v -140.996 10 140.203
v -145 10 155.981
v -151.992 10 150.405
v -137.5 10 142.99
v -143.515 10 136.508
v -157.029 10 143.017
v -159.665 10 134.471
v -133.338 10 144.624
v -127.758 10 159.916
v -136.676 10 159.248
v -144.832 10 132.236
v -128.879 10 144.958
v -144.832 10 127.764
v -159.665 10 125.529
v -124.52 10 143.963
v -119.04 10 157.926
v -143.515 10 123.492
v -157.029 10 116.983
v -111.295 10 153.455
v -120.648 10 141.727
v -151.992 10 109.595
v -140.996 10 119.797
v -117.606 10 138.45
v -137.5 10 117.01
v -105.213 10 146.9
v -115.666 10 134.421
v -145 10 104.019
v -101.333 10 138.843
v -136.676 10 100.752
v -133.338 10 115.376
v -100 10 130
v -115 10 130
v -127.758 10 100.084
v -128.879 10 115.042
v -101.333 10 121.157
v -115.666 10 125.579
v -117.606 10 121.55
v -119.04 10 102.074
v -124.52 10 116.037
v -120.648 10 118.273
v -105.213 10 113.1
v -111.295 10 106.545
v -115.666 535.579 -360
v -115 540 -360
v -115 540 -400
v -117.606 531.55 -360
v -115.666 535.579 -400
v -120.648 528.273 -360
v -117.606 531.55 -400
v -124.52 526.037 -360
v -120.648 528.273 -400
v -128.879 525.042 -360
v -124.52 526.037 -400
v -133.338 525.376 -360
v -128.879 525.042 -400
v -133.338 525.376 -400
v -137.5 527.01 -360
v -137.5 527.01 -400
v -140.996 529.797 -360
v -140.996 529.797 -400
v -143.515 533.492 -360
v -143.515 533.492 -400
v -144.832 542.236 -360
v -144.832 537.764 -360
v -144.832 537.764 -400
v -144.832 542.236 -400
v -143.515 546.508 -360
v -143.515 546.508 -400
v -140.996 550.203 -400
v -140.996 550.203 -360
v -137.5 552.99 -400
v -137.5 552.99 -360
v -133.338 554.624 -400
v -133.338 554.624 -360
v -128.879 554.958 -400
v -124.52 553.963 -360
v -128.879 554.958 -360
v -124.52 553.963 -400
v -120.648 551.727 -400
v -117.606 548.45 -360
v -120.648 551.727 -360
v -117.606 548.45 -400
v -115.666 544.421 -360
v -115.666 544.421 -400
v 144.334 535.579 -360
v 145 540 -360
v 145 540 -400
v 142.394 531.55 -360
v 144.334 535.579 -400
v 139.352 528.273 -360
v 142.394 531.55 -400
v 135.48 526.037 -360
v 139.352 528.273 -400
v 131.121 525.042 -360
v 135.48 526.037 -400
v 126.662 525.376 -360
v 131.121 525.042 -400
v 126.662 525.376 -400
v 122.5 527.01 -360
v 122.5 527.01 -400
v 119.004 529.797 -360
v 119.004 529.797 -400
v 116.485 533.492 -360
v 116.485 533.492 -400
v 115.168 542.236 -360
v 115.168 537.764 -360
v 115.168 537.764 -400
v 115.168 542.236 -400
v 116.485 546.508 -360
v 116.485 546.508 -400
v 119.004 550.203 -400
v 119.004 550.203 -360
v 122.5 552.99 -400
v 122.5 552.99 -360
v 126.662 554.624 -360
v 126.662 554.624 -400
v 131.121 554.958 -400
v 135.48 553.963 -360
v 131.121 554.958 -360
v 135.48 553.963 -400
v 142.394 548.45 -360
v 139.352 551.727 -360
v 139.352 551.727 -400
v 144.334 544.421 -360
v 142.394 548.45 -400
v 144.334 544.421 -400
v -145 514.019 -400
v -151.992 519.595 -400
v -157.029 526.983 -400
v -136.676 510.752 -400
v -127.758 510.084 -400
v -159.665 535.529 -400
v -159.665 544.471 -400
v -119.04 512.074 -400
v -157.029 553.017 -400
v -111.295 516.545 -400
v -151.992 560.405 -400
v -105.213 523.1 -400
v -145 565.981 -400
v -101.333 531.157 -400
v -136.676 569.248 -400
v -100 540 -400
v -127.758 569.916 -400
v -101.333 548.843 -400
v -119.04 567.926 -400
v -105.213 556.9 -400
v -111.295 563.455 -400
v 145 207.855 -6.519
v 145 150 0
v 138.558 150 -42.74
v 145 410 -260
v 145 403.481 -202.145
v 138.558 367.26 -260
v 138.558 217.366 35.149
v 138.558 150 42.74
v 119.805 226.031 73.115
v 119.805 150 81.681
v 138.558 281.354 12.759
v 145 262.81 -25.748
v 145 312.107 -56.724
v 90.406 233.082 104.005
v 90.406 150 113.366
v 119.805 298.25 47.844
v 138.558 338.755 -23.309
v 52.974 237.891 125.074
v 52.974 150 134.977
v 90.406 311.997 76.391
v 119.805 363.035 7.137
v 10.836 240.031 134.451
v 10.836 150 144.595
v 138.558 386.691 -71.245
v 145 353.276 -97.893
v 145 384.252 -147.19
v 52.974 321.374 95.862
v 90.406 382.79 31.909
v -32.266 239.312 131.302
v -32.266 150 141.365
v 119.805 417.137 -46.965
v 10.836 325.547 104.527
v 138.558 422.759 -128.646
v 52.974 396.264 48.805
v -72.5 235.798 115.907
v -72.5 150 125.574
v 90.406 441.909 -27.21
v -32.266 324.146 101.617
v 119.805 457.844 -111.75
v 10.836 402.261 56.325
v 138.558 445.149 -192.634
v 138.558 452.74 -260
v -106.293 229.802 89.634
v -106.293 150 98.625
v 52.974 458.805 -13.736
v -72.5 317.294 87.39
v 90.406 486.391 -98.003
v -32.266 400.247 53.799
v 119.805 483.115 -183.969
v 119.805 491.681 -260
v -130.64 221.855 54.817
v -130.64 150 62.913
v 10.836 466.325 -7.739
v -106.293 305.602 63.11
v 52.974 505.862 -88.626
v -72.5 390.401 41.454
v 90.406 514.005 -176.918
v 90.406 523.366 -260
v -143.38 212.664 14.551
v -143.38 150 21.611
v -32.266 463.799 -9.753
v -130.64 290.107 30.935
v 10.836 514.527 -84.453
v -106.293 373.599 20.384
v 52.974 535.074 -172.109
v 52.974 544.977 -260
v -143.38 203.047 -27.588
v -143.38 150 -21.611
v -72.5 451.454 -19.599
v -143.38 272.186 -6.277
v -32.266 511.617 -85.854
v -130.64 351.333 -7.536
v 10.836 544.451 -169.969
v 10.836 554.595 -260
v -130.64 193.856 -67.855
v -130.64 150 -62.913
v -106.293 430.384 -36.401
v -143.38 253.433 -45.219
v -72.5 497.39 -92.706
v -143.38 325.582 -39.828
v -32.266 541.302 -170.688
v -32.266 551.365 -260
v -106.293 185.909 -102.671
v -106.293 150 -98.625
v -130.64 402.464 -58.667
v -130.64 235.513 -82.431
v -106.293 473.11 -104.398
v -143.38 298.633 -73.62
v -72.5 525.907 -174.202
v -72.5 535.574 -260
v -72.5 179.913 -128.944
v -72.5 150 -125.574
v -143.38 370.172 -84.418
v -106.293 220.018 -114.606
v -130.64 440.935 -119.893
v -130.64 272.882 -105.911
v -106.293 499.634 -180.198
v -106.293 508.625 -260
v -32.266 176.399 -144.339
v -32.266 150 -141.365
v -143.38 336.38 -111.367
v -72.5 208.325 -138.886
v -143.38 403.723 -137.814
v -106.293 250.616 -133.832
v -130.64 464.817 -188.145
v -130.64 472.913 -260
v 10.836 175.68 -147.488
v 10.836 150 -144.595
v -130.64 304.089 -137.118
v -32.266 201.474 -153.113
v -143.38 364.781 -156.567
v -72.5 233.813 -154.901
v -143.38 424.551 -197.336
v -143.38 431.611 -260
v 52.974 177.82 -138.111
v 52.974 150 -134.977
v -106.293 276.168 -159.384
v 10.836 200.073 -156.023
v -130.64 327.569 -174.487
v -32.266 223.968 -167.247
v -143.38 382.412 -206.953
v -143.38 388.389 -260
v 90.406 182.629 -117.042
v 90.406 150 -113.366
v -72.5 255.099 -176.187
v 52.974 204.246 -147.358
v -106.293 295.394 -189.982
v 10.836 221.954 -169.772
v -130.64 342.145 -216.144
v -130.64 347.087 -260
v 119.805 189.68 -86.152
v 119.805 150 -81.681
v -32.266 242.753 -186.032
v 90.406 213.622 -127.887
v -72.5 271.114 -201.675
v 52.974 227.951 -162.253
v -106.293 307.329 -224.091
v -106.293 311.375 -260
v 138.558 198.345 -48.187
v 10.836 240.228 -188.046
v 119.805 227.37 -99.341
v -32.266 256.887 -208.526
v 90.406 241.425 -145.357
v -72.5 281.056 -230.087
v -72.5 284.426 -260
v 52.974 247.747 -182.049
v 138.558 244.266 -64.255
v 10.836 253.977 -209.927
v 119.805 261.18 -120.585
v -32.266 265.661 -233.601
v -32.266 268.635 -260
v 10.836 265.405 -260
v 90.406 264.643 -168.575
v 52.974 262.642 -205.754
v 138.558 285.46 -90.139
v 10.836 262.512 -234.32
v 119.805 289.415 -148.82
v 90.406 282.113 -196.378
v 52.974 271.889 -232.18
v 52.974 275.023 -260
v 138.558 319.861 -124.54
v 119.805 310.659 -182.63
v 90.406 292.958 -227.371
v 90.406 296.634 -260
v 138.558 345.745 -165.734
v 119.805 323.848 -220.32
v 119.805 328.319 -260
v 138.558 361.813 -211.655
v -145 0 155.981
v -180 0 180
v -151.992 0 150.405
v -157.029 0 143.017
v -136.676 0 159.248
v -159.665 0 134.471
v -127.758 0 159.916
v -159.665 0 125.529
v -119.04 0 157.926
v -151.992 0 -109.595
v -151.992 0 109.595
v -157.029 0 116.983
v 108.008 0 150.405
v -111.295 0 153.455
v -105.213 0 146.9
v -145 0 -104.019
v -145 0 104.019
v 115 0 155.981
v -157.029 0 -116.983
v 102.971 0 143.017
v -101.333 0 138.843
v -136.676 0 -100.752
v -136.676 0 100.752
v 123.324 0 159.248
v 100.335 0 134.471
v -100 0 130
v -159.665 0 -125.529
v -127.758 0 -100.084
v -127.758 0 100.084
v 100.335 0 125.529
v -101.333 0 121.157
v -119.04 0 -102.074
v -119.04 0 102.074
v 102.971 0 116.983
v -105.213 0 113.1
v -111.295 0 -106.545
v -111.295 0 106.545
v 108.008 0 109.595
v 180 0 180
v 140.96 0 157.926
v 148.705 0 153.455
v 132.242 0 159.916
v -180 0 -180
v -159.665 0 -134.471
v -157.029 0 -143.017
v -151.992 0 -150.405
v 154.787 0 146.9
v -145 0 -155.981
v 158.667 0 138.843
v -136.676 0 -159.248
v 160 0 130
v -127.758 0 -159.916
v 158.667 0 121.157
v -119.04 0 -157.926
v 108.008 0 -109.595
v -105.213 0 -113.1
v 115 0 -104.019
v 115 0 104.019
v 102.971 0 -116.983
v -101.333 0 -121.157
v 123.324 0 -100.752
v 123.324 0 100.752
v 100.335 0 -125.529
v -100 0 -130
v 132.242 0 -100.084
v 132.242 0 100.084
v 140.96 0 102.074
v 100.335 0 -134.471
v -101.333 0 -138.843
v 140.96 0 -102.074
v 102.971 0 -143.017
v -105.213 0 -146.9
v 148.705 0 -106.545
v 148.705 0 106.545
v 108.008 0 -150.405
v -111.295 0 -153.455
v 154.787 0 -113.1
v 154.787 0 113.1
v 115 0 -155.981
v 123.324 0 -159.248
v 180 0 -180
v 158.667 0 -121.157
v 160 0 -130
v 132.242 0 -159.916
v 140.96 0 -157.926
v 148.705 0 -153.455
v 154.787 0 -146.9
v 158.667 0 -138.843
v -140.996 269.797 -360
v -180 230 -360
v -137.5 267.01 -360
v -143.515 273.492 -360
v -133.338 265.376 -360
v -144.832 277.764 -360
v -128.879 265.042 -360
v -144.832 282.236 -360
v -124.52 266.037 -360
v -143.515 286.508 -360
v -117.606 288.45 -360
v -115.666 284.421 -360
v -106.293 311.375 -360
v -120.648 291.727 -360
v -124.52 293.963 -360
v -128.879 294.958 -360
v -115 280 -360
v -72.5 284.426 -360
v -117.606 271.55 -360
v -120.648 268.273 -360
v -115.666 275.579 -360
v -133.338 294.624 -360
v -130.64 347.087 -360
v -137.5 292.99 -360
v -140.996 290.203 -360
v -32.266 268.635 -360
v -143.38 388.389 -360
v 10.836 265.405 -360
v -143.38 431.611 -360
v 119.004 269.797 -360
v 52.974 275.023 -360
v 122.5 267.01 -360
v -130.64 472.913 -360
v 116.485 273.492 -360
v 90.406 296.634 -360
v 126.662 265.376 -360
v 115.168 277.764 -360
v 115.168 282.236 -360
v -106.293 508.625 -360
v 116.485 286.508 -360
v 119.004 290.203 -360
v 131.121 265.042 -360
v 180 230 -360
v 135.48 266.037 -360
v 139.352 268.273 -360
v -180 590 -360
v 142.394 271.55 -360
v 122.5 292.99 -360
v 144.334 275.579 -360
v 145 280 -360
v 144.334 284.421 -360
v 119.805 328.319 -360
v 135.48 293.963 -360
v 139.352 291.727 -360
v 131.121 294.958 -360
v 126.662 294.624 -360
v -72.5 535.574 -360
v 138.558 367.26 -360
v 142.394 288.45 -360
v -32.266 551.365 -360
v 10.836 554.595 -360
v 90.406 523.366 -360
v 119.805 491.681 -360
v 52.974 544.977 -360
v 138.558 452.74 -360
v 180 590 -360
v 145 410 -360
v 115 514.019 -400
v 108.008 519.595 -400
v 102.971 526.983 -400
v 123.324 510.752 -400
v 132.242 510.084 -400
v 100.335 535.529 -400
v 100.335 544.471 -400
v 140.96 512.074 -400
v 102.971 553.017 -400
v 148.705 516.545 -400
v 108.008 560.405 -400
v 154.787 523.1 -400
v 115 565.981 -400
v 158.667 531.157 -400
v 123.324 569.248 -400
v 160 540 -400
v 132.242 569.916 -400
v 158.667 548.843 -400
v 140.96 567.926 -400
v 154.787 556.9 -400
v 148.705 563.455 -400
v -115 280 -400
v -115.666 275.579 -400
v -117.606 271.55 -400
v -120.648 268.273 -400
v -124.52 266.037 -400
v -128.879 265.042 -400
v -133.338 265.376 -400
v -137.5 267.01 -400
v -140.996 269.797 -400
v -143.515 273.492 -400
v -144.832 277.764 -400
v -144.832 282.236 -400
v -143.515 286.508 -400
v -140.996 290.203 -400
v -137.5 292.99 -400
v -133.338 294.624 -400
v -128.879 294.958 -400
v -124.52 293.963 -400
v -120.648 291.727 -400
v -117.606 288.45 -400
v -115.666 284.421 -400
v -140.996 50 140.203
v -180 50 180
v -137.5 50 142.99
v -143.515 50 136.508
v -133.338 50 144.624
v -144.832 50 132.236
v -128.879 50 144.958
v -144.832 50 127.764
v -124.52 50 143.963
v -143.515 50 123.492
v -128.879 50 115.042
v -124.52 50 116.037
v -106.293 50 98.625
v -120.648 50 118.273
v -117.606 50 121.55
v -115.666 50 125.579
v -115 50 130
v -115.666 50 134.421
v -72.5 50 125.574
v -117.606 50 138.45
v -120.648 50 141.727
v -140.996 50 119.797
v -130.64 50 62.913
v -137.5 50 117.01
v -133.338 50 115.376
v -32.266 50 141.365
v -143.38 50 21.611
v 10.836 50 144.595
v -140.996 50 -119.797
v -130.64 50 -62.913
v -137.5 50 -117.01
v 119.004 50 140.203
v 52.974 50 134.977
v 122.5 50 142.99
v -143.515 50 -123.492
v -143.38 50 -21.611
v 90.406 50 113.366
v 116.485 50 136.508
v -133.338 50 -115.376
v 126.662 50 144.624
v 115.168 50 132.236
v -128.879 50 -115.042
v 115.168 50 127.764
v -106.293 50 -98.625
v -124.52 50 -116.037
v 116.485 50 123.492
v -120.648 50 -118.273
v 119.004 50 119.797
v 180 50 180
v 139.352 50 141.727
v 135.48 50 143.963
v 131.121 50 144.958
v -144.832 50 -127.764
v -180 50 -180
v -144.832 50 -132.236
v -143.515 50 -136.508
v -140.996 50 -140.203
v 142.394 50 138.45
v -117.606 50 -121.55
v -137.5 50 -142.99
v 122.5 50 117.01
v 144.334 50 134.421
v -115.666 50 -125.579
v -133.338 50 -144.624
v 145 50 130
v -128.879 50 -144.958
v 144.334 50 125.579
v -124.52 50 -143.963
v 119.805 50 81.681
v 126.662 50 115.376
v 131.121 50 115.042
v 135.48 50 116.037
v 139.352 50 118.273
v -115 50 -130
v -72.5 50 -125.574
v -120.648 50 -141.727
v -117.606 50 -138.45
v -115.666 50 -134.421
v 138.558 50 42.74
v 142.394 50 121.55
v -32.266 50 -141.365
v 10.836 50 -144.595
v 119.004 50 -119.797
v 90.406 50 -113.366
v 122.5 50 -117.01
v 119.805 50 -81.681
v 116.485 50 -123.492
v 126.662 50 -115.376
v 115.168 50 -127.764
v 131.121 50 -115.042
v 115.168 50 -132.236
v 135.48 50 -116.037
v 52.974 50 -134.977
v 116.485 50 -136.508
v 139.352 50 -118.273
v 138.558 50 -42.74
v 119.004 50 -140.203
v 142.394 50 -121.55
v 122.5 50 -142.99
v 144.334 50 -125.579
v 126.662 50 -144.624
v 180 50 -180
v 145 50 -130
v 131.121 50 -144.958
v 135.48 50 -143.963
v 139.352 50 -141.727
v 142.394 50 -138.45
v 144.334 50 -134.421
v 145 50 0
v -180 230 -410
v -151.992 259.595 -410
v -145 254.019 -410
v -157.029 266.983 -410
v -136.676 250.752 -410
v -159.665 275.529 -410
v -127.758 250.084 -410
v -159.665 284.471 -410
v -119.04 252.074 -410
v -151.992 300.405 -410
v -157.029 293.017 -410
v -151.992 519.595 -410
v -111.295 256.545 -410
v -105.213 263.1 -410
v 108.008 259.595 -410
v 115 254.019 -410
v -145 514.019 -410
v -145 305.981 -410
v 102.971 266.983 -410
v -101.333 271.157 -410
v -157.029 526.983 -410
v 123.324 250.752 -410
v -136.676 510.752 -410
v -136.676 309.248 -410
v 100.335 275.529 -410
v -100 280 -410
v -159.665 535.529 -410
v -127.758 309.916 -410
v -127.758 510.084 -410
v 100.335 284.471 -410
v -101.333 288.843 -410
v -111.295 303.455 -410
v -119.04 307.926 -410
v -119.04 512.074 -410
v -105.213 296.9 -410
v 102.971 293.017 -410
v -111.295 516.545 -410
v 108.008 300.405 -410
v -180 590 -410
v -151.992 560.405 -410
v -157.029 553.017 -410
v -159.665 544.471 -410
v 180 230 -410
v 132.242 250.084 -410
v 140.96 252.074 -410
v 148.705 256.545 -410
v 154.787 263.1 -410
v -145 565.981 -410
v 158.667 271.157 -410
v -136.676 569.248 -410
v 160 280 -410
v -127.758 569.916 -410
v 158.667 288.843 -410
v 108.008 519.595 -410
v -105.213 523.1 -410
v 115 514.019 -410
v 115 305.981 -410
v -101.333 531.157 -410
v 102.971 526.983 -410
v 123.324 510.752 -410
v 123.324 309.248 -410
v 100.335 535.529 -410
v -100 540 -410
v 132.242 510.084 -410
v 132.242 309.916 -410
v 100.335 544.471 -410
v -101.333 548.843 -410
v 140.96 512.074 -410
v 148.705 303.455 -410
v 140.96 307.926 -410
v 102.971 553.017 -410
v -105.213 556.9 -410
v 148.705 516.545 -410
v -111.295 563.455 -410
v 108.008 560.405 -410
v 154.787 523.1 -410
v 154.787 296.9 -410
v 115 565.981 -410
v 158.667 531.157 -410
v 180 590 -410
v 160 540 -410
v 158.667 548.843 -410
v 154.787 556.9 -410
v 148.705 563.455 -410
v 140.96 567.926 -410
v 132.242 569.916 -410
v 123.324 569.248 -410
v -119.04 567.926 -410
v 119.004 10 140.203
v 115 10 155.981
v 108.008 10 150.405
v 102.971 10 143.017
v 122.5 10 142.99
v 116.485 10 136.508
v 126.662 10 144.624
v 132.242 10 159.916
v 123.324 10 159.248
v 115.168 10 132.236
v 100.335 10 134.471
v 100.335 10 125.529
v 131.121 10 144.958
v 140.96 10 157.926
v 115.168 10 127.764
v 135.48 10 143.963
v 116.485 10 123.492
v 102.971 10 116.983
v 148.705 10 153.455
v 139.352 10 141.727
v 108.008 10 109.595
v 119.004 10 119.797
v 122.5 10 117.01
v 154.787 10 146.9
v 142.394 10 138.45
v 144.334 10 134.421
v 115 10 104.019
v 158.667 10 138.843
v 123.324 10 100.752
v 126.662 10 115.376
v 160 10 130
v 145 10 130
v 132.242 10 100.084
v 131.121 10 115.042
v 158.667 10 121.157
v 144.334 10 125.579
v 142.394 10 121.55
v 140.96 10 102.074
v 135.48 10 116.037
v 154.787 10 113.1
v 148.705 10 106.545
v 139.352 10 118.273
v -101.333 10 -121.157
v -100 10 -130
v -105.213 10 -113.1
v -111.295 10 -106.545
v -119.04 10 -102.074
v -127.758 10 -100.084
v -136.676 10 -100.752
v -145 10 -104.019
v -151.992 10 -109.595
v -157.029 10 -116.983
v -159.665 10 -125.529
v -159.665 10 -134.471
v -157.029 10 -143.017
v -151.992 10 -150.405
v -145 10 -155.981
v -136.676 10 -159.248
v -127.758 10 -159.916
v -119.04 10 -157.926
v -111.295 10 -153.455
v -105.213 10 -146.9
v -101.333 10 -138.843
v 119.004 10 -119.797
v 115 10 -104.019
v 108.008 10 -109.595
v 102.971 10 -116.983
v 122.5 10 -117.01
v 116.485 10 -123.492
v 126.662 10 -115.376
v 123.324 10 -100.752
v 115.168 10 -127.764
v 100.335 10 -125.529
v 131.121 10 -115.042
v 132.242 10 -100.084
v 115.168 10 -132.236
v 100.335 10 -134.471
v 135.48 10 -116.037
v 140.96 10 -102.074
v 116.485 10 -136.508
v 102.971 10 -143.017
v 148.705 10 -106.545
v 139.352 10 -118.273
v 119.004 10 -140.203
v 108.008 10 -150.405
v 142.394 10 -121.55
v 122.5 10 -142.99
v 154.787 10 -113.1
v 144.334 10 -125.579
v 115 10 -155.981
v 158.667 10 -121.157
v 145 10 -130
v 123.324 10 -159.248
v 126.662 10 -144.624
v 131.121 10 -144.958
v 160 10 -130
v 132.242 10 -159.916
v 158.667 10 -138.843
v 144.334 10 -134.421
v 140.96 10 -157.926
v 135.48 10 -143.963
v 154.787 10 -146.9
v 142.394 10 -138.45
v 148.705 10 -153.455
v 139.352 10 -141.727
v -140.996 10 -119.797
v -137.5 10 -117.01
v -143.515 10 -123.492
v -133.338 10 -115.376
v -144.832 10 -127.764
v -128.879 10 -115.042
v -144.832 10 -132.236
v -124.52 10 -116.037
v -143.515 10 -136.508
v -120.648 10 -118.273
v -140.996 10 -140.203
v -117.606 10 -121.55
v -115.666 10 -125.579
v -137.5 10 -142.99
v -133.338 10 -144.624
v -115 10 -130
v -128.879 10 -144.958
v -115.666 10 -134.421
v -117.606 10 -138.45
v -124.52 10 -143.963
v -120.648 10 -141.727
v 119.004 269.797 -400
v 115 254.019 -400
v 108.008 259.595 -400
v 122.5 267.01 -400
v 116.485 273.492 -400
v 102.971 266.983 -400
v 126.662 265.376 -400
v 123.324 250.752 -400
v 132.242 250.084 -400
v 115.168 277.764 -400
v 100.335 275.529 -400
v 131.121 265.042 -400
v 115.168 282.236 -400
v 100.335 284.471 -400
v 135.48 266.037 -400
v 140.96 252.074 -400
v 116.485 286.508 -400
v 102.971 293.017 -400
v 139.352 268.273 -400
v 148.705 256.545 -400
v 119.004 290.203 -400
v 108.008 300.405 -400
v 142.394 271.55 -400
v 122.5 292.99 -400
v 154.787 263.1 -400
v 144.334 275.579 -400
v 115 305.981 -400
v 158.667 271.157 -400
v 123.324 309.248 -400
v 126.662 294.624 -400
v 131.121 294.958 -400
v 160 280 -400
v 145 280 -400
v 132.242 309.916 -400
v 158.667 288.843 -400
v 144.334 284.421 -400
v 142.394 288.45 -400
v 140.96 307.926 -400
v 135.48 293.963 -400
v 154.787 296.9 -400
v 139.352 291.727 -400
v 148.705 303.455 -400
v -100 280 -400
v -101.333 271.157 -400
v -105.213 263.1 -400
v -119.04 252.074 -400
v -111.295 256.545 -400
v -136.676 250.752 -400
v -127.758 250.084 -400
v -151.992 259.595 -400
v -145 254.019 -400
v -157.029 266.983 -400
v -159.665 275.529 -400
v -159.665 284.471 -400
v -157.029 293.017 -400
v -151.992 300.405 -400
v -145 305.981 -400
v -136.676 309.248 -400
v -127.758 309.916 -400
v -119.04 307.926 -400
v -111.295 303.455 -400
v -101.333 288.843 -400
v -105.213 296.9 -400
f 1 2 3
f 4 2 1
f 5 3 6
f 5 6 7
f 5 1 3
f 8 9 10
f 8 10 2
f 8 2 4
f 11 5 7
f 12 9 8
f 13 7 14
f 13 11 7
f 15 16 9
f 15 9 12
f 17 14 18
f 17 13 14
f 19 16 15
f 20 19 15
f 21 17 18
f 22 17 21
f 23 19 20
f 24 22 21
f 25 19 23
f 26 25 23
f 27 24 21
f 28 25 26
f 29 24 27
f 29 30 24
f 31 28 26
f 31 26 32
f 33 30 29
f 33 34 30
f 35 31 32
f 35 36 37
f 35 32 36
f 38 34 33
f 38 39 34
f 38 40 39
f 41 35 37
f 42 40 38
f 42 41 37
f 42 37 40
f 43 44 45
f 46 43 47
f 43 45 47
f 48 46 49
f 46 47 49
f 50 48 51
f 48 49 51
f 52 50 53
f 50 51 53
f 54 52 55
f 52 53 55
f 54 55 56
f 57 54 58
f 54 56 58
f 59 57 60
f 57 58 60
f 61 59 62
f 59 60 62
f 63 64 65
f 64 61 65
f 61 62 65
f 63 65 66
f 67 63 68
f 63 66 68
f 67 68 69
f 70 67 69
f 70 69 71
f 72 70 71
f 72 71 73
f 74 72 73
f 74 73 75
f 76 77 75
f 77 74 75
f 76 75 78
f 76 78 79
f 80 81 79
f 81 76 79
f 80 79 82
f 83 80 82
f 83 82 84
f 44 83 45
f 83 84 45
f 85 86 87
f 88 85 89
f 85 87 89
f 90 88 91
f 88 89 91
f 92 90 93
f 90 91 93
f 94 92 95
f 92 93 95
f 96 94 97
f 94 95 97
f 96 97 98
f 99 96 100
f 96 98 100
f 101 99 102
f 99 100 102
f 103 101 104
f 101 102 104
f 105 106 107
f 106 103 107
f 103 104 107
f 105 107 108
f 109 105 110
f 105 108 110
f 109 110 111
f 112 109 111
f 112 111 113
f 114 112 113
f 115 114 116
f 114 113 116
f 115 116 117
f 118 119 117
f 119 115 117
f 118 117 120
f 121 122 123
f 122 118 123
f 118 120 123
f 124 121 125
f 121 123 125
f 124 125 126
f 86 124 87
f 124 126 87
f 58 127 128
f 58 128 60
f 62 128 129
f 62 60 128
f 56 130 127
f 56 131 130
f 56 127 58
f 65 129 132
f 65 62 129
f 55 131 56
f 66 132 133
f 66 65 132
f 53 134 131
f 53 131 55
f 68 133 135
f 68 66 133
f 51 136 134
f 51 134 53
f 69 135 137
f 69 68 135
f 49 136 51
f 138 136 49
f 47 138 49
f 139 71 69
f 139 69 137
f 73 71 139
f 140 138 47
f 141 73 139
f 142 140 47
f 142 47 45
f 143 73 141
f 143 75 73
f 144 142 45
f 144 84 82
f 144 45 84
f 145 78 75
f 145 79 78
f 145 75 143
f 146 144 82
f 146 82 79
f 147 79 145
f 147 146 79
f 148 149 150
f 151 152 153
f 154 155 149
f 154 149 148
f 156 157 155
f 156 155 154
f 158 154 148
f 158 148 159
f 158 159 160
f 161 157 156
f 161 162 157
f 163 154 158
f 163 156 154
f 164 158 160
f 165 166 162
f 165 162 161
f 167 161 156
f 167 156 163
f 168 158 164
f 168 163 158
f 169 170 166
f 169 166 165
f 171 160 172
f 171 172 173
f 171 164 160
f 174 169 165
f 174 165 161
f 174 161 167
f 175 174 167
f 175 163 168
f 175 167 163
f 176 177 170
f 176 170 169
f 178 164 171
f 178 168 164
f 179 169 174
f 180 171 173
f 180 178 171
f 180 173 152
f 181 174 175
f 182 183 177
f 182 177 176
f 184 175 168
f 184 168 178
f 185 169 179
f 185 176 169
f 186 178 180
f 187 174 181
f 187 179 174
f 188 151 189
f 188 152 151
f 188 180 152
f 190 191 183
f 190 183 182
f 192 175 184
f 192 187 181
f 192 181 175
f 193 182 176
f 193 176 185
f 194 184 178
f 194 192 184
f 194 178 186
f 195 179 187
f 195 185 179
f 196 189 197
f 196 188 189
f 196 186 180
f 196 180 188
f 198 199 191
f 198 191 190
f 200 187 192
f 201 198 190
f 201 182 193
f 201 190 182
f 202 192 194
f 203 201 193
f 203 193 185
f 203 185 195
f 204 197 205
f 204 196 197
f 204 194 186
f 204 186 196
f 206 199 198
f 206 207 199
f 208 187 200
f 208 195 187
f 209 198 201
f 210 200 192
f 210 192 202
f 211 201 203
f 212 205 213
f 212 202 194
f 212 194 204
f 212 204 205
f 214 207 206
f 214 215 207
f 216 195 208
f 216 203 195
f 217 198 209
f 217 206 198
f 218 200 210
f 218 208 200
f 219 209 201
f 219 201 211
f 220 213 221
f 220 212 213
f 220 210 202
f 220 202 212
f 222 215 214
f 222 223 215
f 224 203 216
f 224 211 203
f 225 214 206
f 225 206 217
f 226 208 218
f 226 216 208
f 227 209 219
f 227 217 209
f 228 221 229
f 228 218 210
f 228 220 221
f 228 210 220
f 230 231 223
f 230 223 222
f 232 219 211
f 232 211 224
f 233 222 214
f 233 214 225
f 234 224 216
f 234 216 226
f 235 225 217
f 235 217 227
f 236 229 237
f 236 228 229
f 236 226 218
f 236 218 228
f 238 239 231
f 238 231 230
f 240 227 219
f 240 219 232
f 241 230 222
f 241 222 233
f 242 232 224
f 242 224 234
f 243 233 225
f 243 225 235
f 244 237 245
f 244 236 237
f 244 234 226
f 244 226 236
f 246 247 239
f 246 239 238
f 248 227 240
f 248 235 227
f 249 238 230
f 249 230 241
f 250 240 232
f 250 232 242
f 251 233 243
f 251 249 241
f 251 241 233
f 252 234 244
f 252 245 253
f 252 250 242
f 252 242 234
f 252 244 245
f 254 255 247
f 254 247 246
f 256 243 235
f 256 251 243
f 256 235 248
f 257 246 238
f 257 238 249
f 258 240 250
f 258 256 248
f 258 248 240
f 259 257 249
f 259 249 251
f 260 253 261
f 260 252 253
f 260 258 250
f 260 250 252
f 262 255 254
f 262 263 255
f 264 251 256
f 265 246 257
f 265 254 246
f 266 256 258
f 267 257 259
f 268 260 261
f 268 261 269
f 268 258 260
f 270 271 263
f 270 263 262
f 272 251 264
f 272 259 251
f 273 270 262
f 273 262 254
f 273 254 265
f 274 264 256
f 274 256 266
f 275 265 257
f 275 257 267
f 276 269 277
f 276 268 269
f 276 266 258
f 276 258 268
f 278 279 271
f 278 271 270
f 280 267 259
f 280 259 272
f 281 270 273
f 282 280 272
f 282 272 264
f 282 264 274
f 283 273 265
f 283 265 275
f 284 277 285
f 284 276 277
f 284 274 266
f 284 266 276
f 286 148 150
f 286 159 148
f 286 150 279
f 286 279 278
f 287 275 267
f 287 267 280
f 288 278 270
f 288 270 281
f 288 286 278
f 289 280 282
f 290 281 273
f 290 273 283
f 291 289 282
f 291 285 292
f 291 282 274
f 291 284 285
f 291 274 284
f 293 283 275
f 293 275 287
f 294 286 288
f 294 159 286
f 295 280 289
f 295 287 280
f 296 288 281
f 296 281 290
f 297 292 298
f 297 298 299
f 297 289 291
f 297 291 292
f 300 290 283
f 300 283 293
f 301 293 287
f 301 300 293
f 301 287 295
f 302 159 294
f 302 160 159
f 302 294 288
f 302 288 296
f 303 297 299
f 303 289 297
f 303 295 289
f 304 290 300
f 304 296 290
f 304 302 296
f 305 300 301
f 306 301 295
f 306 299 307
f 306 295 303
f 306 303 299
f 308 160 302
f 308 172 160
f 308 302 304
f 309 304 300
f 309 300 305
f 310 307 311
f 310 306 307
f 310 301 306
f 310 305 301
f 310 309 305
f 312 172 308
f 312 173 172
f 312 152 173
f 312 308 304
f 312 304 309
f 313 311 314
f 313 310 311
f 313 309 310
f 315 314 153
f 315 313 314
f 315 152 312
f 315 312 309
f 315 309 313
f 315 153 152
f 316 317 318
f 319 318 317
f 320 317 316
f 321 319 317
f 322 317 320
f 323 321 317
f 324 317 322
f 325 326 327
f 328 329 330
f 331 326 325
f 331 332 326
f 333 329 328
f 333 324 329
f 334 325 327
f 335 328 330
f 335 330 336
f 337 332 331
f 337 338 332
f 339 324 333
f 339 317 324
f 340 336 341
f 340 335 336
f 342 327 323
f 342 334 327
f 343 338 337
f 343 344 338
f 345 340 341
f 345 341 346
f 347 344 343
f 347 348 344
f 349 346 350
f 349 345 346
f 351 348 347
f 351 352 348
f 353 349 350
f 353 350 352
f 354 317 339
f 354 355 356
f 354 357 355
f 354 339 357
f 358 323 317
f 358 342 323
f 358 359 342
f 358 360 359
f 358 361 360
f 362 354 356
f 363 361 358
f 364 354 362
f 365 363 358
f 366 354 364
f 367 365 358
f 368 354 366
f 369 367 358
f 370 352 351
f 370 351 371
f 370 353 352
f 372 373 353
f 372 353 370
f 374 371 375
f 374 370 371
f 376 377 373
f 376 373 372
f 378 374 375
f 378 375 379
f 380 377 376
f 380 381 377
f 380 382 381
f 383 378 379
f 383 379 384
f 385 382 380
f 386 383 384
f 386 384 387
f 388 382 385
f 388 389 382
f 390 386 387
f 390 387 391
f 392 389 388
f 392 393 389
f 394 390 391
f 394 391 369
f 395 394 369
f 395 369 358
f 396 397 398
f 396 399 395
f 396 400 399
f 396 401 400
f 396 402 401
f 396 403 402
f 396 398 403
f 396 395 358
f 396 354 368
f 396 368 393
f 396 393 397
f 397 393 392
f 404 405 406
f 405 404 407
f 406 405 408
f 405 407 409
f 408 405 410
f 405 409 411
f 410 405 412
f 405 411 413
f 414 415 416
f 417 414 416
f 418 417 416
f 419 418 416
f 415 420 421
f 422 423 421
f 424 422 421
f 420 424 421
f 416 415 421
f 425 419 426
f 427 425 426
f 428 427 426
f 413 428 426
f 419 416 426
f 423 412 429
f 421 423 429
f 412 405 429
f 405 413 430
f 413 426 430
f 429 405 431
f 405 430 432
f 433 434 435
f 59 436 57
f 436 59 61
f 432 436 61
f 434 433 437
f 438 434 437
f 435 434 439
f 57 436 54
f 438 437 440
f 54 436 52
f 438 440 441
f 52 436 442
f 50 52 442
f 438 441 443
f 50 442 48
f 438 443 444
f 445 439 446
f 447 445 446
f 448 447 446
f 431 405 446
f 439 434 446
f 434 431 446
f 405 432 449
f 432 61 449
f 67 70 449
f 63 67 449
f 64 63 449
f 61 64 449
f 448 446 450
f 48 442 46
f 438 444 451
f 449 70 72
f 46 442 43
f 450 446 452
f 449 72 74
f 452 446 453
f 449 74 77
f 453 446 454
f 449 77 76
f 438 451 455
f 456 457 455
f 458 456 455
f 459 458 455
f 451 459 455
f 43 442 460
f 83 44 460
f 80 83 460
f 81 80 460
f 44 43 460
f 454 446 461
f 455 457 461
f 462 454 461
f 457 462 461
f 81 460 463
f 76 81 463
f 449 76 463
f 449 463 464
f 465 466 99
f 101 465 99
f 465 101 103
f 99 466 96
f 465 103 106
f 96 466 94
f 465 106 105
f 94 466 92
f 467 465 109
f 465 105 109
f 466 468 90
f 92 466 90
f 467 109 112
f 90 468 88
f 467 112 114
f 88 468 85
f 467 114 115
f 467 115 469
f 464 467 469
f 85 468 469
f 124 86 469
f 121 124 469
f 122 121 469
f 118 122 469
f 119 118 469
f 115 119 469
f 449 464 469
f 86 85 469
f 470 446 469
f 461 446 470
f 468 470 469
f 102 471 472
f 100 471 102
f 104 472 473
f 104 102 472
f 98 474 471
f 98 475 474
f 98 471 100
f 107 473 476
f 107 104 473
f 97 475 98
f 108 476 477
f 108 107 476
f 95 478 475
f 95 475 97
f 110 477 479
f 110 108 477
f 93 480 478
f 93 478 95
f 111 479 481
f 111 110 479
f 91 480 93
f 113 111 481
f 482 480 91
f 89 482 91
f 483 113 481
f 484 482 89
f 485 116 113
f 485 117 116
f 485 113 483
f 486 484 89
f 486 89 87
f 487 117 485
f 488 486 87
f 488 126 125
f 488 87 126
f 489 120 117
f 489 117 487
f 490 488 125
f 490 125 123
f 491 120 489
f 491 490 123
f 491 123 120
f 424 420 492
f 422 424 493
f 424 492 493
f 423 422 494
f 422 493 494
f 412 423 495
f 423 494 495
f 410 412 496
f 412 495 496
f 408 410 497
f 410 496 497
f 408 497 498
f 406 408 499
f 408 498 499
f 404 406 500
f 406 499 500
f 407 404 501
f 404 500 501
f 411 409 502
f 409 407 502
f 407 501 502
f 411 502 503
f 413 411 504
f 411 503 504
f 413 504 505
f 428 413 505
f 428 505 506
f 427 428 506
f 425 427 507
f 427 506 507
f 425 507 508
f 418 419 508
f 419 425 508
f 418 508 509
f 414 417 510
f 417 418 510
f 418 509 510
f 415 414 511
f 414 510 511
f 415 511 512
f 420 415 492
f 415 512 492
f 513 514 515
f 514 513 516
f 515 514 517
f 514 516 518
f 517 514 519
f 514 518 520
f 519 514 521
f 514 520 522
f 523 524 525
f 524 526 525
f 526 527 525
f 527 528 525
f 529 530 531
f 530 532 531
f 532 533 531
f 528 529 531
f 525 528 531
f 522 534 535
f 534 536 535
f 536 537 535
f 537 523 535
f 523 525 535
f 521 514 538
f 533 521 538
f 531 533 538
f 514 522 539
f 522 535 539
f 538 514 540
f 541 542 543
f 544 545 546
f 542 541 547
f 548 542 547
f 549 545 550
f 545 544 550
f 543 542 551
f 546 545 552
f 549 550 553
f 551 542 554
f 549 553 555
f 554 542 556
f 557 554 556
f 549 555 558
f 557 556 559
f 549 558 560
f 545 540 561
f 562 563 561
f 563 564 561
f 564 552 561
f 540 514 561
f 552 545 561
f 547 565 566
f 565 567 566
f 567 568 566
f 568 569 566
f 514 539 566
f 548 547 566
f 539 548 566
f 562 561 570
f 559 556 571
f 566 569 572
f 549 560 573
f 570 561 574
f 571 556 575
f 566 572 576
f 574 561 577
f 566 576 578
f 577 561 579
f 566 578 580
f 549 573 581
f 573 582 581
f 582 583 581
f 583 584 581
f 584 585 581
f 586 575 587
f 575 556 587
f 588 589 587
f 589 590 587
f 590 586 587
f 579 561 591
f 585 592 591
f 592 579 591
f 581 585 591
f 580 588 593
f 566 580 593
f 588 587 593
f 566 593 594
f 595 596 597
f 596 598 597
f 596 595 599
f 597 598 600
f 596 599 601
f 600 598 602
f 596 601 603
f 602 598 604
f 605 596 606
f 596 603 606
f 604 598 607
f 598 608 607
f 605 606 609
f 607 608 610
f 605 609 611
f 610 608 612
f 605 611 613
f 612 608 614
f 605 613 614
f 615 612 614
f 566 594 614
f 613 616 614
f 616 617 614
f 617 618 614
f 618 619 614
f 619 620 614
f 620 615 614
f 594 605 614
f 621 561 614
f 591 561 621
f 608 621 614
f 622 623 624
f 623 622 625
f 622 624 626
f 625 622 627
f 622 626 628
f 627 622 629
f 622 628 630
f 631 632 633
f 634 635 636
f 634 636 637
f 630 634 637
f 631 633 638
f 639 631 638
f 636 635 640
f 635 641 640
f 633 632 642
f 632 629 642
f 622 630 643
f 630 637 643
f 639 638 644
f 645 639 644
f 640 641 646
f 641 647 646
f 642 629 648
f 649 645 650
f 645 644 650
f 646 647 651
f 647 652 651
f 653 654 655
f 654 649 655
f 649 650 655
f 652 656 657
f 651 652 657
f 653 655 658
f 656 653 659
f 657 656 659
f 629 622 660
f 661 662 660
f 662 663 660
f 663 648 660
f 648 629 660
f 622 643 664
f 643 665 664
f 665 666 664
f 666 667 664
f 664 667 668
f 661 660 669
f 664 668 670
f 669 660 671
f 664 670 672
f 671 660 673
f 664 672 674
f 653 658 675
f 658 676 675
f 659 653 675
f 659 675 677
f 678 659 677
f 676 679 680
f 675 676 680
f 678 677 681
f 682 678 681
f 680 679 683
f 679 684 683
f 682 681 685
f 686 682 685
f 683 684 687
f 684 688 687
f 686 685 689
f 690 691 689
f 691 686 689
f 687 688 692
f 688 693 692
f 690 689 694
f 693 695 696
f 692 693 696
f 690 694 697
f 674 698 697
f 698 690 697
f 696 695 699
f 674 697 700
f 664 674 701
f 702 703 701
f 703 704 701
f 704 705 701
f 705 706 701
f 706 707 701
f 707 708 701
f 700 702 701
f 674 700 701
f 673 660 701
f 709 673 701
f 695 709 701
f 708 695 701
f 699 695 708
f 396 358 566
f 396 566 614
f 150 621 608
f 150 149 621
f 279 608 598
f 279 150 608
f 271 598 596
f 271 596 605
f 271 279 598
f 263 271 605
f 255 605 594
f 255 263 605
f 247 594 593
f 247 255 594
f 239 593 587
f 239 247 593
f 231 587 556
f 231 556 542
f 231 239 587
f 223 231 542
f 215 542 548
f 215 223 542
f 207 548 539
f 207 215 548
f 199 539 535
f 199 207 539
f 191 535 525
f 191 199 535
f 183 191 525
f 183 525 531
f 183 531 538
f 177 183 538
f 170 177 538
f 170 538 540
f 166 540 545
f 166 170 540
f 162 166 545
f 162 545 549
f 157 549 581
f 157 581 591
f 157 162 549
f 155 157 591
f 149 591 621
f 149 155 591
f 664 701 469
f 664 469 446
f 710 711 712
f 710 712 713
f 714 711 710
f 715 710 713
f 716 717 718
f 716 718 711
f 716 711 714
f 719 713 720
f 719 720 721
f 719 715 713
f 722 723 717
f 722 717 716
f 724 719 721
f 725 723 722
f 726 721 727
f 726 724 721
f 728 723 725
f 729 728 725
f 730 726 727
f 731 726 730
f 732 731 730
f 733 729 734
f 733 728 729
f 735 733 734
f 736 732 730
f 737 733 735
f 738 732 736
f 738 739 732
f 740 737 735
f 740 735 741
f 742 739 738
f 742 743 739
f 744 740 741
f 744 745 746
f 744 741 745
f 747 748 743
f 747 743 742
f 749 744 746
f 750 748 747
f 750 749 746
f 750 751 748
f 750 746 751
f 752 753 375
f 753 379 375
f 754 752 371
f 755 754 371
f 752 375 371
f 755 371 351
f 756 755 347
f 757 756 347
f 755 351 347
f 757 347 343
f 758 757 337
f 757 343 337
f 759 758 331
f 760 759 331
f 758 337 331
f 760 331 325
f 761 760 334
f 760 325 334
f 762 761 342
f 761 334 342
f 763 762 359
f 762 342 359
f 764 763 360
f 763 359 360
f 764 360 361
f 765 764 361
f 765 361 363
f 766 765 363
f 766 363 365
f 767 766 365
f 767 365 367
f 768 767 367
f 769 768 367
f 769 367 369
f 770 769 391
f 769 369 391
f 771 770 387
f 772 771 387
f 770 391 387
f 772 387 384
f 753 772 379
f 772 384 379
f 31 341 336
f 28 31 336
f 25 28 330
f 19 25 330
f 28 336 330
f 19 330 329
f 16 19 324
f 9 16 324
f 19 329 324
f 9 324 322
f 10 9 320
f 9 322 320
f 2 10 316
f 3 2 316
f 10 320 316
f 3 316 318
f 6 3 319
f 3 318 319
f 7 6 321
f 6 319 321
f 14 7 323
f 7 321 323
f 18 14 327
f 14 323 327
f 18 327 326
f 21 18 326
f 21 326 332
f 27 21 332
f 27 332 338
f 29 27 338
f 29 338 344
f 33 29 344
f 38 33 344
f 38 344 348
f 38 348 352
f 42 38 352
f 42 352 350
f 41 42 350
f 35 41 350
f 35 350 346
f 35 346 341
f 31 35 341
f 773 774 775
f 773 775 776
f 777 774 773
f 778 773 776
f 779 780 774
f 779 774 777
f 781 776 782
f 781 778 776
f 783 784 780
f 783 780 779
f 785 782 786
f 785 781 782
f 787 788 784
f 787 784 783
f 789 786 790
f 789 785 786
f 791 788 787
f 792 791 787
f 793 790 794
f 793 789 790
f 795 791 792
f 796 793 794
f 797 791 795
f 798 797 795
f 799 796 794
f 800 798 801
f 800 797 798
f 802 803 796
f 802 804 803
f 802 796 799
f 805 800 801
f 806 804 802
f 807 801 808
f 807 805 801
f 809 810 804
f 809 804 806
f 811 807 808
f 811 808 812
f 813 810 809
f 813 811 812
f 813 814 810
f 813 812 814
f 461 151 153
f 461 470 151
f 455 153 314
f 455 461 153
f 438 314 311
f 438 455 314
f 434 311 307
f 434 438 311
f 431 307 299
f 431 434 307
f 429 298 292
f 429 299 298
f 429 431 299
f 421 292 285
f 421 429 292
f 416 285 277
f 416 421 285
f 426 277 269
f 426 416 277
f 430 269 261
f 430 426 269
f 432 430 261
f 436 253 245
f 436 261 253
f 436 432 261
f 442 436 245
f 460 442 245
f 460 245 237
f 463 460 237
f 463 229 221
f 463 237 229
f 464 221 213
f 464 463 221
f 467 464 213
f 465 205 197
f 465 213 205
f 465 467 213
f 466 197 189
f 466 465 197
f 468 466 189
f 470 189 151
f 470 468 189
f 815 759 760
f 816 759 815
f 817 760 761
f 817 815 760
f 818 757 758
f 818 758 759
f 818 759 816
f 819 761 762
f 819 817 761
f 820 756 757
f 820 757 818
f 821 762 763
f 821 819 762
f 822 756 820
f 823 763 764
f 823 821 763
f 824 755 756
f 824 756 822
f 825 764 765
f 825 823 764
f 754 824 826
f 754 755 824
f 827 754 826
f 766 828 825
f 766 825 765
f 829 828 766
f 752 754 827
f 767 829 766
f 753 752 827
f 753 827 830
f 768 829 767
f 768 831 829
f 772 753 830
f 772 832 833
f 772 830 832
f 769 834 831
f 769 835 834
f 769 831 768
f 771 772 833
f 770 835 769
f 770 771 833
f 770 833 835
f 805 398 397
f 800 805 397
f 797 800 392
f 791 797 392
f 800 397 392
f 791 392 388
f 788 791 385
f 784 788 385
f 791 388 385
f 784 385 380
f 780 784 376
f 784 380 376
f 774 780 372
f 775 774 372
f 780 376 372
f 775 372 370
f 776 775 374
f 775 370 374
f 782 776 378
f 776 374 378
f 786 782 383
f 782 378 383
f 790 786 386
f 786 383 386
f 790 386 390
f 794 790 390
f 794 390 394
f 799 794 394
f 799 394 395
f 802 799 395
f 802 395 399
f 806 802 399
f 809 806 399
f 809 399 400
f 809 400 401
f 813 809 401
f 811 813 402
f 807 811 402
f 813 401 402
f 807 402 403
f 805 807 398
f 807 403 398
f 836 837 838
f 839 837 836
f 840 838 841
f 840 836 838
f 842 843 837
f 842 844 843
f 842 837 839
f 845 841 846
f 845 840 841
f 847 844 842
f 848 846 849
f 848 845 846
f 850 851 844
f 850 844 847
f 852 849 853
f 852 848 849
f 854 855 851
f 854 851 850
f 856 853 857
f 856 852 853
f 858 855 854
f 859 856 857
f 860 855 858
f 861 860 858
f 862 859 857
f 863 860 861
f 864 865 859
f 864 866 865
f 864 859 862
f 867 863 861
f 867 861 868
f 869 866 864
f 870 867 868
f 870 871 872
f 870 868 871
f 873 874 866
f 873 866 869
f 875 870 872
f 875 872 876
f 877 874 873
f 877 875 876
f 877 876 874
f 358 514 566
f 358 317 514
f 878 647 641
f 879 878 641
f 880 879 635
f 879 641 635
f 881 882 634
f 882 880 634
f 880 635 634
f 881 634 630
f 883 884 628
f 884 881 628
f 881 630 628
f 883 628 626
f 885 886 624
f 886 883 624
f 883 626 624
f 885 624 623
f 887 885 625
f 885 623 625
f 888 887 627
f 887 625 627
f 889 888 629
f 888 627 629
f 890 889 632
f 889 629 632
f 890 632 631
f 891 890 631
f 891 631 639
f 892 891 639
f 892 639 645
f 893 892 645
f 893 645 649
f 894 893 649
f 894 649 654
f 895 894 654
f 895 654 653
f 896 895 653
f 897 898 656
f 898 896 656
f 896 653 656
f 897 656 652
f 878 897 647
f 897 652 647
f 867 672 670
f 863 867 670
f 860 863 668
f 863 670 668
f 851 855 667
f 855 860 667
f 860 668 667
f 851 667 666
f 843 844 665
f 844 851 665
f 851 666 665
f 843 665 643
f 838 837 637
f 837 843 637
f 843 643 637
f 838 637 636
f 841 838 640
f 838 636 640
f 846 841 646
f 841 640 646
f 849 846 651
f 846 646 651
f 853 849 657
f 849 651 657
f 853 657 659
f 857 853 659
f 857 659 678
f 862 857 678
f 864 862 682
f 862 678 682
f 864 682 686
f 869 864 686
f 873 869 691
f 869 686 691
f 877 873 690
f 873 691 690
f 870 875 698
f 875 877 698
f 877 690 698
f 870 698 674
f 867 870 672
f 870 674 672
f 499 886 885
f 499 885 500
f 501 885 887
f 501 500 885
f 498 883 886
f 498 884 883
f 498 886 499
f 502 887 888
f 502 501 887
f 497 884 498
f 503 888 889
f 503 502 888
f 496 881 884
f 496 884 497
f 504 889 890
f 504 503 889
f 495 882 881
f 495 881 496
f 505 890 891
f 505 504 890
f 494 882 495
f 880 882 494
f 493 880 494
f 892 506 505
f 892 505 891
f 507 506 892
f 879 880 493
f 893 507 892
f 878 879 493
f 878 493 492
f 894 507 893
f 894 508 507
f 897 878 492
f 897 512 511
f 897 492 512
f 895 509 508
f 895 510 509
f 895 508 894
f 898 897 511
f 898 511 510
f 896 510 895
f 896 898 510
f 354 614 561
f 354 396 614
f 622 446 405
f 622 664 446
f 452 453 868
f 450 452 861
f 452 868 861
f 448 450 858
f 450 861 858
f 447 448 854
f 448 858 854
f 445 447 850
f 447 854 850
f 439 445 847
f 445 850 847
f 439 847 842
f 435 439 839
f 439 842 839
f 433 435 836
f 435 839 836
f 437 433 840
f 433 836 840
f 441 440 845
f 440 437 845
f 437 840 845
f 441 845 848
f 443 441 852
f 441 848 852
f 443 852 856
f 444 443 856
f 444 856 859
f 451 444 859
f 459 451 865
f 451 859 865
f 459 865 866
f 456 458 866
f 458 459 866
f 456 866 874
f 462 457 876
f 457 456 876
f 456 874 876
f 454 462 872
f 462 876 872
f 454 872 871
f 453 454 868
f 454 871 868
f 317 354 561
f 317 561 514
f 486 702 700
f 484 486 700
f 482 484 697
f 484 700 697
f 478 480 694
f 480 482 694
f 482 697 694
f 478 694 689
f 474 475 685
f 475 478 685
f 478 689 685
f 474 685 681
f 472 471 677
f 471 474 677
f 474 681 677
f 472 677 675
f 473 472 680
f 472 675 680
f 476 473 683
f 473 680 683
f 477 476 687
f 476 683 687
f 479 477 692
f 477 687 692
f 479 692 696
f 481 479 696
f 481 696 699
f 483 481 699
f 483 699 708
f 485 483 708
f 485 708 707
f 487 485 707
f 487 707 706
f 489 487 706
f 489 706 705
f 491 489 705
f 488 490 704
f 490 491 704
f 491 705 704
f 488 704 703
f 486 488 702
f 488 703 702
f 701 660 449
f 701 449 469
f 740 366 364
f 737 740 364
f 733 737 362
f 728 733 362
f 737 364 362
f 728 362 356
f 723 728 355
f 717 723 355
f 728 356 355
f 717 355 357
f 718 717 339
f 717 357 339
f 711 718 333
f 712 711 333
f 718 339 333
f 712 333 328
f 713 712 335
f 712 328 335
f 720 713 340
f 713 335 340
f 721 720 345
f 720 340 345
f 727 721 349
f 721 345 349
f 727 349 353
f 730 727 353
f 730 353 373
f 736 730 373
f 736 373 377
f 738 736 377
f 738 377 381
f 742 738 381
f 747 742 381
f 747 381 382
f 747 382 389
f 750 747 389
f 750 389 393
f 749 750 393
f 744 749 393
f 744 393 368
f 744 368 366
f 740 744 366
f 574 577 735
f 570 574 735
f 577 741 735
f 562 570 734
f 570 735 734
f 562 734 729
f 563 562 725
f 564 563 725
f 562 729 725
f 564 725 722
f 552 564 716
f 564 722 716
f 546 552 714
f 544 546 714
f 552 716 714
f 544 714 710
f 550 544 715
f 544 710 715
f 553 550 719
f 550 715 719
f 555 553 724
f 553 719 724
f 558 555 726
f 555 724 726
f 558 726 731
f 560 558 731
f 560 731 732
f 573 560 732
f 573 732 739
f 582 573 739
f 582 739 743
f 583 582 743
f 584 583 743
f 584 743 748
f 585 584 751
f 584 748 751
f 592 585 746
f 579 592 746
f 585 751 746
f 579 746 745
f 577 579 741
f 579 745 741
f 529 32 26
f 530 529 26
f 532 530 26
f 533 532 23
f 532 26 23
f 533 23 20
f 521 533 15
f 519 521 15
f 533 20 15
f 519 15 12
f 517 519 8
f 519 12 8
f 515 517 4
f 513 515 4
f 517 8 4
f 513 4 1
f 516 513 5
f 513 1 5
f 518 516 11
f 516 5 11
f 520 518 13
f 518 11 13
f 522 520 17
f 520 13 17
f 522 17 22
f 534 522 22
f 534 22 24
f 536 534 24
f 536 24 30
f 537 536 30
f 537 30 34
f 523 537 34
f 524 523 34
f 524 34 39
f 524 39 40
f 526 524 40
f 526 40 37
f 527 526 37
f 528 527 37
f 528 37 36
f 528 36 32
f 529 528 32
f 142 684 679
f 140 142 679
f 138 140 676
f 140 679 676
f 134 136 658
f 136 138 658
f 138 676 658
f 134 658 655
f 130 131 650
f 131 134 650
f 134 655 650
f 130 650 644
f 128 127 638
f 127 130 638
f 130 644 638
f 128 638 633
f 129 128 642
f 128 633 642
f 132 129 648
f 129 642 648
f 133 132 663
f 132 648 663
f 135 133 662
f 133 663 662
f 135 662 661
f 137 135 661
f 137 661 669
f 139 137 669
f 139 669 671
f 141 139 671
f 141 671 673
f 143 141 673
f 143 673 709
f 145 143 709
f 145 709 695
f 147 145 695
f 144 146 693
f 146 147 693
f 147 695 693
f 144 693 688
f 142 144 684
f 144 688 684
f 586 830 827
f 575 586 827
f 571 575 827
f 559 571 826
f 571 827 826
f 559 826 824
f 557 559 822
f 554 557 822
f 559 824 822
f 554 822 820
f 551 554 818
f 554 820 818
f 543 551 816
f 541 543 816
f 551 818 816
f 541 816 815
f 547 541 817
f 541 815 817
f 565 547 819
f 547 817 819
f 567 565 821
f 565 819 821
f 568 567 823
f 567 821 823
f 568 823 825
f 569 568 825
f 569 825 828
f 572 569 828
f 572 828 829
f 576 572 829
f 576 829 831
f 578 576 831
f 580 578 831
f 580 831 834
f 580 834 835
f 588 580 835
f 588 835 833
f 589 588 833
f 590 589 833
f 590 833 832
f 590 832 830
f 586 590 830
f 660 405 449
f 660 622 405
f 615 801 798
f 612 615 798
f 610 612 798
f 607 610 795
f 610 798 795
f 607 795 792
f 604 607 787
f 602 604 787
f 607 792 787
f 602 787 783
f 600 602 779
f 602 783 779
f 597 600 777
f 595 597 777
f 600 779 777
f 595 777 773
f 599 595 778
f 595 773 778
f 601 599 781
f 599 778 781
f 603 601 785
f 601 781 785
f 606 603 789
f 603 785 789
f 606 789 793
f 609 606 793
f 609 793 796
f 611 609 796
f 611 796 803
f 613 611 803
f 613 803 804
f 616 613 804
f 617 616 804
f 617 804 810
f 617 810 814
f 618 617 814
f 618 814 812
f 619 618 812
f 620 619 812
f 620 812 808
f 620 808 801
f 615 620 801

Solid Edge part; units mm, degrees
sketch "Sketch1" plane through (0, 0, 0) normal (1, 0, 0) x (0, 1, 0)
  line L0 (410, -260) -> (410, -410)
  line L1 (0, 0) -> (150, 0)
  arc A0 (150, 0) -> (410, -260) centre (150, -260) cw
sketch "Sketch2" plane through (0, 0, 0) normal (0, -1, 0) x (1, 0, 0)
  circle A0 centre (0, 0) radius 145
sweep "SweptProtrusion_1" add profiles "Sketch2" path "Sketch1"
sketch "Sketch3" plane through (0, 0, 0) normal (1, 0, 0) x (0, 1, 0)
  line L0 (410, -260) -> (410, -410)
  line L1 (0, 0) -> (150, 0)
  arc A0 (150, 0) -> (410, -260) centre (150, -260) cw
sketch "Sketch4" plane through (0, 0, 0) normal (0, -1, 0) x (1, 0, 0)
  circle A0 centre (0, 0) radius 130
sweep "SweptCutout_1" cut profiles "Sketch4" path "Sketch3"
sketch "Sketch5" plane through (0, 0, 0) normal (0, -1, 0) x (1, 0, 0)
  line L0 (180, 180) -> (-180, 180)
  line L1 (-180, 180) -> (-180, -180)
  line L2 (-180, -180) -> (180, -180)
  line L3 (180, -180) -> (180, 180)
  circle A0 centre (0, 0) radius 130
extrude "ExtrudedProtrusion_2" add sketch "Sketch5" against normal blind 50
sketch "Sketch6" plane through (0, 0, 0) normal (0, -1, 0) x (1, 0, 0)
  circle A0 centre (130, 130) radius 30
  circle A1 centre (-130, 130) radius 30
  circle A2 centre (-130, -130) radius 30
  circle A3 centre (130, -130) radius 30
extrude "ExtrudedCutout_1" cut sketch "Sketch6" against normal blind 10
sketch "Sketch7" plane through (0, 0, 0) normal (0, -1, 0) x (1, 0, 0)
  circle A0 centre (130, 130) radius 15
  circle A1 centre (-130, 130) radius 15
  circle A2 centre (-130, -130) radius 15
  circle A3 centre (130, -130) radius 15
extrude "ExtrudedCutout_2" cut sketch "Sketch7" against normal blind 50
mirror "Mirror1" about plane through (0, 333.8478, -76.1522) normal (0, -0.7071068, 0.7071068) of "ExtrudedProtrusion_2", "ExtrudedCutout_1", "ExtrudedCutout_2", "SweptProtrusion_1"
